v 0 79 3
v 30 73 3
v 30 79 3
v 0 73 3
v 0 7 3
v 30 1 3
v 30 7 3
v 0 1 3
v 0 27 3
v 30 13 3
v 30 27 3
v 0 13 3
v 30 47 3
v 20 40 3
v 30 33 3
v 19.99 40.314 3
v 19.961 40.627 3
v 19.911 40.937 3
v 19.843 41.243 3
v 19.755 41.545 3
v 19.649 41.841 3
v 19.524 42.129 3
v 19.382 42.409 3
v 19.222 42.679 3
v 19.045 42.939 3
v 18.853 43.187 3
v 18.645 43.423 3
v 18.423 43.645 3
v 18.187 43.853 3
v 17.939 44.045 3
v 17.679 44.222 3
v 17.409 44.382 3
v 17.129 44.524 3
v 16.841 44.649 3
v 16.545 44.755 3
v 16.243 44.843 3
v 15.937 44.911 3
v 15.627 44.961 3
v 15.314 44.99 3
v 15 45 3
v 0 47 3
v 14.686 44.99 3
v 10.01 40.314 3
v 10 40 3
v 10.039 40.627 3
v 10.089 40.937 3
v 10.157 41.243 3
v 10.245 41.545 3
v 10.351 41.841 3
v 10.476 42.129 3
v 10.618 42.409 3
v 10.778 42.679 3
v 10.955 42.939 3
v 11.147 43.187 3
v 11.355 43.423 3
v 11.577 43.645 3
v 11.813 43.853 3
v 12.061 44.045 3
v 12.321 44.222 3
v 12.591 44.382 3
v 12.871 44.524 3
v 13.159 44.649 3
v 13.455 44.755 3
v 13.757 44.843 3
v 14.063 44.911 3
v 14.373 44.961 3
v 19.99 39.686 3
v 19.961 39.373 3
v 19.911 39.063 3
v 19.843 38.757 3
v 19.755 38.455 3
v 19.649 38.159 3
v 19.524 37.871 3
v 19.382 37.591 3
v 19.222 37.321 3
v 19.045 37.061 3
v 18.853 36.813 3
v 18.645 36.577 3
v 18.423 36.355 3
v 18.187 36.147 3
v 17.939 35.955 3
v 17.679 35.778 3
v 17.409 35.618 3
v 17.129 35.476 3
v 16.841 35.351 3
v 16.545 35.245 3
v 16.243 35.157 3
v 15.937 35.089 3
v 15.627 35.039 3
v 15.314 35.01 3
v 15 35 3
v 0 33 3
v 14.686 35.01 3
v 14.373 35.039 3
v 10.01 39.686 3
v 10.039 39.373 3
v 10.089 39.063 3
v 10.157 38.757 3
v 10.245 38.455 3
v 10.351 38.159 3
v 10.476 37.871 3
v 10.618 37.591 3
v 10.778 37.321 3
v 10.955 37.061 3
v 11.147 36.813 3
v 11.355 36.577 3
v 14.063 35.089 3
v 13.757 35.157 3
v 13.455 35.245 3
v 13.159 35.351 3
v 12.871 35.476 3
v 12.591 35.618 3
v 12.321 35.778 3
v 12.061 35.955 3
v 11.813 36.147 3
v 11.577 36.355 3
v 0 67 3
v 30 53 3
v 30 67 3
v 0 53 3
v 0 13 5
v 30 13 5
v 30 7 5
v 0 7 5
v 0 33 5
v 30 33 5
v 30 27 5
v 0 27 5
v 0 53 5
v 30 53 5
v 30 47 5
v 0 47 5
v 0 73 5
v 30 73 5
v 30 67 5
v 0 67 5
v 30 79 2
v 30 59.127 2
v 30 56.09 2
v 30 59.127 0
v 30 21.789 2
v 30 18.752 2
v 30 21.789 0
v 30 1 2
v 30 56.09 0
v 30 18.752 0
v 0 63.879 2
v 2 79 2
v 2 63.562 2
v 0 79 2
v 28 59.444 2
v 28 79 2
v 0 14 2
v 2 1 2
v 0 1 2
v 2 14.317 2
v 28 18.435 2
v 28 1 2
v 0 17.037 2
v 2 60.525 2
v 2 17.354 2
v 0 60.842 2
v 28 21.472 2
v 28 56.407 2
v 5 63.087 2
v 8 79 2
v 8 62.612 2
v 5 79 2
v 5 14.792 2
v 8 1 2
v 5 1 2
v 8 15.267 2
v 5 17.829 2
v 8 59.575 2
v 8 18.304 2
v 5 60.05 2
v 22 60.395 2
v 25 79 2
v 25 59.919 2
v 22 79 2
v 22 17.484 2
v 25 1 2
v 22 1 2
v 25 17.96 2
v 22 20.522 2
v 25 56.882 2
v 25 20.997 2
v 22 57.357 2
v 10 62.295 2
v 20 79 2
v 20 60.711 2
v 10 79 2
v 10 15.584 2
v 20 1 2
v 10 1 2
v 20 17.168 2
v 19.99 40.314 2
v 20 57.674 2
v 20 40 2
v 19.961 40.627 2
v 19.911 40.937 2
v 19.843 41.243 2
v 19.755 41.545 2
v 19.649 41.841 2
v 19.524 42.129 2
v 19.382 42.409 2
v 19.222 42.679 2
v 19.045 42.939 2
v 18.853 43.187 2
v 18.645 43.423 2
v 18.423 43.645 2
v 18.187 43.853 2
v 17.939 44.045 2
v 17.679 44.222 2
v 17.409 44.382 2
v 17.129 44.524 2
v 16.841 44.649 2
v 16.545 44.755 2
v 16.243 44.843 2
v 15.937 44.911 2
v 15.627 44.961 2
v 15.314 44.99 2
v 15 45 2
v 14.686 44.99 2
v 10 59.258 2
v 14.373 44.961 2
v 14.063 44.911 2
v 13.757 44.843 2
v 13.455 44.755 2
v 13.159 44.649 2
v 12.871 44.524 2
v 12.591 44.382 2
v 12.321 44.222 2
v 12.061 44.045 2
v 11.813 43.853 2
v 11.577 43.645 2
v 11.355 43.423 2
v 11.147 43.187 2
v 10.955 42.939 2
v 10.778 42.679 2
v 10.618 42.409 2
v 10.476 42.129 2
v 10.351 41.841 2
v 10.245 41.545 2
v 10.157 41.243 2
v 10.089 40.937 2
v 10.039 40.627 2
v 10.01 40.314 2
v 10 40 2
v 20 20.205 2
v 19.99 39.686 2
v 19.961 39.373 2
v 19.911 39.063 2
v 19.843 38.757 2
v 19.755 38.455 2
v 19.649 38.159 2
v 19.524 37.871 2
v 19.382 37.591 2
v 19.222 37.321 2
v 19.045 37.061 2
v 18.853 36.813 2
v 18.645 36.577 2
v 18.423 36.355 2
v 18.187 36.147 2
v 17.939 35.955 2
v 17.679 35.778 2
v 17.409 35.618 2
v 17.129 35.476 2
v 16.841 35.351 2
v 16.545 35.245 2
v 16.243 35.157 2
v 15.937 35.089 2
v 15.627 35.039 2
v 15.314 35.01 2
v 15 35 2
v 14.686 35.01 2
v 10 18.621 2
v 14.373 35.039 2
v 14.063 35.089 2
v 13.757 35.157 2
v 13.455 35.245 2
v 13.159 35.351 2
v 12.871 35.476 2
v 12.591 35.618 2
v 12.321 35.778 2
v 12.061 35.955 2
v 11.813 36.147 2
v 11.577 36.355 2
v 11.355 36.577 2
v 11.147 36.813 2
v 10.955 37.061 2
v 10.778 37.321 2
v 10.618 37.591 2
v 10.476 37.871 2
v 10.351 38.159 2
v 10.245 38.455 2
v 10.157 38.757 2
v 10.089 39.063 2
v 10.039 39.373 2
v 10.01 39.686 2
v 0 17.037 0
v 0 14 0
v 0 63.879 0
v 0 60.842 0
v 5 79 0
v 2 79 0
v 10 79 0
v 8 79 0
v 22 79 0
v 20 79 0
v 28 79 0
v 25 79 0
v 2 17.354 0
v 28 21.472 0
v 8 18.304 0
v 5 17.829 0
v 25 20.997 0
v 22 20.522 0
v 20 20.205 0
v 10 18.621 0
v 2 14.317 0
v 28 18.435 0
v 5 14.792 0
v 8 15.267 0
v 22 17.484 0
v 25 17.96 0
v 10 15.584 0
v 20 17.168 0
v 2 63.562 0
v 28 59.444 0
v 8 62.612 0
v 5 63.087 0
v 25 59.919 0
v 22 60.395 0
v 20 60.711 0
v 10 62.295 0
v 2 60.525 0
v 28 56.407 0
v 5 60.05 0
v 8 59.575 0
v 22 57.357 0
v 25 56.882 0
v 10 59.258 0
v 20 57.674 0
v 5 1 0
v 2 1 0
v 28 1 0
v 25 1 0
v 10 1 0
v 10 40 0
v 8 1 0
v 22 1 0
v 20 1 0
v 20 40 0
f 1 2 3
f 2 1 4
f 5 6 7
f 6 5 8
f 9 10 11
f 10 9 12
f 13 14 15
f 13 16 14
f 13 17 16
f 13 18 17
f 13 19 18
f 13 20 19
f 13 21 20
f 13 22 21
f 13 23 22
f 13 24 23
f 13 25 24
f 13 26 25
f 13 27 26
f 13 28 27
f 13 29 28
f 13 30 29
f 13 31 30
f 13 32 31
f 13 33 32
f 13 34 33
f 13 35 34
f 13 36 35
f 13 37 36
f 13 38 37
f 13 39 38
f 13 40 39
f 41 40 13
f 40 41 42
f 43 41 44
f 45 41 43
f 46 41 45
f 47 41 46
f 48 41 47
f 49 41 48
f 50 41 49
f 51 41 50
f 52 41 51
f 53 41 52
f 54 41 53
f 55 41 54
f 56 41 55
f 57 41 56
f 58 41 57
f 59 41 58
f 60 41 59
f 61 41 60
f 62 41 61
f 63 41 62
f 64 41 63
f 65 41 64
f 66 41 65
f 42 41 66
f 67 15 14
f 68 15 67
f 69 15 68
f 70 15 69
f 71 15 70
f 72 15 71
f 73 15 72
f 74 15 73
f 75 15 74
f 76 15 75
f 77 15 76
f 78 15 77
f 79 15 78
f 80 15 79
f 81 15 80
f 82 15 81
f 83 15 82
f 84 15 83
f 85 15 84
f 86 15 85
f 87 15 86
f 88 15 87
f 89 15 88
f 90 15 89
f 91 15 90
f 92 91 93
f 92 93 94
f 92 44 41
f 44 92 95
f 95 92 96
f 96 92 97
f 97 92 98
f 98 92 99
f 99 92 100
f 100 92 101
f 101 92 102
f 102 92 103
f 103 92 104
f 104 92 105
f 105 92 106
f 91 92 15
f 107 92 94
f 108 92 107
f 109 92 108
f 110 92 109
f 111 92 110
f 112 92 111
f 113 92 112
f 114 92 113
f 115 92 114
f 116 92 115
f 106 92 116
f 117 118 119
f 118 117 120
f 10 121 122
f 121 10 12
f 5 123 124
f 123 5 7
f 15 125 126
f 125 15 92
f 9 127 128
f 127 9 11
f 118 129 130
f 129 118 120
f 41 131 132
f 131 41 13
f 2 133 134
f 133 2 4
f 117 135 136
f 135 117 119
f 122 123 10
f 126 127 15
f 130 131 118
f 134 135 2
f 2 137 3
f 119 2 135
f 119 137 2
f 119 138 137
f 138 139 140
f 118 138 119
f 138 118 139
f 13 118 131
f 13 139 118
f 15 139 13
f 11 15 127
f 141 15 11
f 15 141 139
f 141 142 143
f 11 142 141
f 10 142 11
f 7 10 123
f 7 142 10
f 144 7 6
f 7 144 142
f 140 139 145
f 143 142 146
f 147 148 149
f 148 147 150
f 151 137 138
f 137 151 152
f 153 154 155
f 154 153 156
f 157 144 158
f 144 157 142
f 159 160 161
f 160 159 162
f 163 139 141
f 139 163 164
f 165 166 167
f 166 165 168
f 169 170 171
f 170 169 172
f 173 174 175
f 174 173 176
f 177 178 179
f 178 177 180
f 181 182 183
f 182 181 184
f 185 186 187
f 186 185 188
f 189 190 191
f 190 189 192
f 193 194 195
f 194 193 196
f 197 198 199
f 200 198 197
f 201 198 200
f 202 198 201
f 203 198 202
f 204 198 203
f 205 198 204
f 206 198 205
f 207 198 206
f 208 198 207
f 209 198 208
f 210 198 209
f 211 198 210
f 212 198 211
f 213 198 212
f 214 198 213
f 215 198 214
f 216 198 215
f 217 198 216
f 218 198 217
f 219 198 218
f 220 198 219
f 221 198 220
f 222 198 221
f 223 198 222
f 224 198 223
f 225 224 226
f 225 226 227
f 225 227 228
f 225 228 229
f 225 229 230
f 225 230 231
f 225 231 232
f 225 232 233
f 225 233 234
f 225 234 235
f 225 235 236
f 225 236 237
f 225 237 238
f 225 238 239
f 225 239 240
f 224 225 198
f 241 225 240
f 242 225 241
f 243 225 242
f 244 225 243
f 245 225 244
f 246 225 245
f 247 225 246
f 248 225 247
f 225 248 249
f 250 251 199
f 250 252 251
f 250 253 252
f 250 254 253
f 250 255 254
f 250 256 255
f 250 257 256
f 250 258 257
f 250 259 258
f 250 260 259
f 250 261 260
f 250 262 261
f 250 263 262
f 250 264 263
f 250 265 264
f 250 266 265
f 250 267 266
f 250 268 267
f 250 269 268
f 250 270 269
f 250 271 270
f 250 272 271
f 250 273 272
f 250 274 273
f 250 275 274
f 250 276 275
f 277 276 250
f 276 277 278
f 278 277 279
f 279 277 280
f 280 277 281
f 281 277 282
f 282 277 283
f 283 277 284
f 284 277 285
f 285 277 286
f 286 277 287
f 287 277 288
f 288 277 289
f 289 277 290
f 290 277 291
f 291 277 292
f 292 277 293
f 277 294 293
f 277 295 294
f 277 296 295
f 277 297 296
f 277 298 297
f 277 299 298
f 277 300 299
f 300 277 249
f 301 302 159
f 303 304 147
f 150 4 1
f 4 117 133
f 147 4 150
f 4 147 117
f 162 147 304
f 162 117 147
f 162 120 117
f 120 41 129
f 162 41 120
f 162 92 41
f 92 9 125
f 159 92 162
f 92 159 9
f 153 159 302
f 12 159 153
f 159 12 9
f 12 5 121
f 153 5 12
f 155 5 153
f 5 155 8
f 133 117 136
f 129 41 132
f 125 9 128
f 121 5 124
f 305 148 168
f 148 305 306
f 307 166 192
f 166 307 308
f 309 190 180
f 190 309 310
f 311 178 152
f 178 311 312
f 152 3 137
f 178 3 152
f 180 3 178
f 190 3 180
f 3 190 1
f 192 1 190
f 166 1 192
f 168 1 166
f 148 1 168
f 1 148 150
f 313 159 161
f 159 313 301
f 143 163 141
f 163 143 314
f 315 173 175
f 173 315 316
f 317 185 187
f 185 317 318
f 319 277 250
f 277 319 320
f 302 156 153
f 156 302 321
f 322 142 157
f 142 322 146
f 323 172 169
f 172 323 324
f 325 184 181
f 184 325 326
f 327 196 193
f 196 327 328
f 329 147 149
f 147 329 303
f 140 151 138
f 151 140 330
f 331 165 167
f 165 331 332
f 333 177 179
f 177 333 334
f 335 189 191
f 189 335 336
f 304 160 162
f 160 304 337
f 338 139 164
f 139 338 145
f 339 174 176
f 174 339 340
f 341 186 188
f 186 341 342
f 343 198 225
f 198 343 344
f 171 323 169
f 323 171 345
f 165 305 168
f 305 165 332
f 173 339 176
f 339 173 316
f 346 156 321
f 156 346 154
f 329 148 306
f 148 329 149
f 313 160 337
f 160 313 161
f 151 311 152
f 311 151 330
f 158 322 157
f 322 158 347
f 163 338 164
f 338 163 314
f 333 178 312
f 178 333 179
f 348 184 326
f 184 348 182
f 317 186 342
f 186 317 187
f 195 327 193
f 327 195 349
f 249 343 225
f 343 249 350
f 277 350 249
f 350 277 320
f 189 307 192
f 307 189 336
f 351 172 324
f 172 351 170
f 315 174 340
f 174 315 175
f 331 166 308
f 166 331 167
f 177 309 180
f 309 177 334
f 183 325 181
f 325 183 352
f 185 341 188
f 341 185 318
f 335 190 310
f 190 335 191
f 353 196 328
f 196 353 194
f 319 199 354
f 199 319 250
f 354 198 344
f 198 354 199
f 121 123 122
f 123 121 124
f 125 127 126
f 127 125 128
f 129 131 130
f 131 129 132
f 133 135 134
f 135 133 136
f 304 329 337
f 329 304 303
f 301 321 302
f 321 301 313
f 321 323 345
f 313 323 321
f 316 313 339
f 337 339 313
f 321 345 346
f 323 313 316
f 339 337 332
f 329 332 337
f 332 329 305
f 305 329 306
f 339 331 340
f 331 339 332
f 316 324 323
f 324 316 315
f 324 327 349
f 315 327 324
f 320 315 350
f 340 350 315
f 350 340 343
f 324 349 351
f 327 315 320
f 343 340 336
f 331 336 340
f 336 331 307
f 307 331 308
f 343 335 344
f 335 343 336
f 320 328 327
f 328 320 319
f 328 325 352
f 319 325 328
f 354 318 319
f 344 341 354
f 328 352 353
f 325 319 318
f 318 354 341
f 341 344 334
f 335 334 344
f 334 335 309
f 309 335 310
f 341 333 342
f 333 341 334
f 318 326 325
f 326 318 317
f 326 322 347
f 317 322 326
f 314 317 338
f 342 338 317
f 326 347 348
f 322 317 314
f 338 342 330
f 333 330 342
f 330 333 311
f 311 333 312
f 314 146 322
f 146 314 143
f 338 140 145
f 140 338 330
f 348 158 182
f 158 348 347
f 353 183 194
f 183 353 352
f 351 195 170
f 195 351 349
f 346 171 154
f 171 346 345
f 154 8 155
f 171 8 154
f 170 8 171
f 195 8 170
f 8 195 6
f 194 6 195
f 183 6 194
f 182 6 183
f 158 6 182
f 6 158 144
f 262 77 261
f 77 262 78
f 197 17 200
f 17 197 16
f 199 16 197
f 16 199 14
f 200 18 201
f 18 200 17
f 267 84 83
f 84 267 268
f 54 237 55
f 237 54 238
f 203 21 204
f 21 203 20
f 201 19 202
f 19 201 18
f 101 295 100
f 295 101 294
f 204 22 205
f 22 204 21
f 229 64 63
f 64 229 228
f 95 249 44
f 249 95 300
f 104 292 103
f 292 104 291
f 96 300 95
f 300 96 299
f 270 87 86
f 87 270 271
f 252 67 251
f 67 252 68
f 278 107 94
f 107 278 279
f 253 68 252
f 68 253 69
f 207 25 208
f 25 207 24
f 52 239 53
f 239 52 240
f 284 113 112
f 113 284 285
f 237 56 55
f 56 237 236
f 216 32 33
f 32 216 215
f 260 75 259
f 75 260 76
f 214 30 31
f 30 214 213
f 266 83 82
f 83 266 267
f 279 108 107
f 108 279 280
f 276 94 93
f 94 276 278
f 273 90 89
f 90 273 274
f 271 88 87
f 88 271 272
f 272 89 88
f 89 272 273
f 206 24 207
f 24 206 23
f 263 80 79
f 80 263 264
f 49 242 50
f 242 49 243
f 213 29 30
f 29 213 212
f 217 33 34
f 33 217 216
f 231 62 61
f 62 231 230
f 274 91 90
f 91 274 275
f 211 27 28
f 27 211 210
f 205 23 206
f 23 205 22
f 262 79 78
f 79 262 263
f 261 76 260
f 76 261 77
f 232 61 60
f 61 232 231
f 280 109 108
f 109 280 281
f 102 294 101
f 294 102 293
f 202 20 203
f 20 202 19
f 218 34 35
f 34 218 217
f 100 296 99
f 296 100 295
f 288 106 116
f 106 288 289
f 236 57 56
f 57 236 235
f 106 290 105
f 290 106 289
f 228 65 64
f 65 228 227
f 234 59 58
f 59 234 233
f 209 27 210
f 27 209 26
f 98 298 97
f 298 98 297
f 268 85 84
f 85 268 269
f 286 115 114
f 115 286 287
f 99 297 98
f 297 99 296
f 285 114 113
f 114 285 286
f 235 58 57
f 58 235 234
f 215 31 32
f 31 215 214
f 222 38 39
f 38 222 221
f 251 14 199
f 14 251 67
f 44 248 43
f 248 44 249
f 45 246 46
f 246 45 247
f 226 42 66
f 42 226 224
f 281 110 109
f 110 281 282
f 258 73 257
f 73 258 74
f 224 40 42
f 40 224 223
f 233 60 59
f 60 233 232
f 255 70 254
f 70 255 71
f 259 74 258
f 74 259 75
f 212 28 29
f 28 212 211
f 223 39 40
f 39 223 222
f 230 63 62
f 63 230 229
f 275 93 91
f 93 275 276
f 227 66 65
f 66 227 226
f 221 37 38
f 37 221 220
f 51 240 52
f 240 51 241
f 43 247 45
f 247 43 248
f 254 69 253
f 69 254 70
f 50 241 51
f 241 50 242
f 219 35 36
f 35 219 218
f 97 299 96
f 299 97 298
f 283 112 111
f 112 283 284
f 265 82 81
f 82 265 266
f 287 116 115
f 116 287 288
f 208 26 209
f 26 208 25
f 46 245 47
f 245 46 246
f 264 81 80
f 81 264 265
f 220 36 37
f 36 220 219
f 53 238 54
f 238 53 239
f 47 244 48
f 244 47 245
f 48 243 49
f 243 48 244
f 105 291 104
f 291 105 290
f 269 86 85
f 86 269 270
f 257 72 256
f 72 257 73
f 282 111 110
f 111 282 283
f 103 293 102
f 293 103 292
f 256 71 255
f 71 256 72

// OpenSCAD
/*
don't PLA will be strong enough.
*/

module p8020(len){
  difference(){
    cube([len, 80, 30]);
    translate([-1, 10 - 3, 0])cube([len + 2, 6, 6]);
    translate([-1, 30 - 3, 0])cube([len + 2, 6, 6]);
    translate([-1, 50 - 3, 0])cube([len + 2, 6, 6]);
    translate([-1, 70 - 3, 0])cube([len + 2, 6, 6]);
  }
}
module kick(){
  translate([0, -1, -18])
  difference(){
    cube([30, 80, 20]);
    translate([0, 15, -1])rotate([0, 0, 9])cube([40, 3, 100]);
    translate([-1, 65-3, -1])rotate([0, 0, -9])cube([40, 3, 100]);
    translate([2, -1, 0]) cube([3, 100, 100]);
    translate([25, -1, 0])cube([3, 100, 100]);
    translate([ 8, -1, 0])cube([2, 100, 100]);
    translate([20, -1, 0])cube([2, 100, 100]);
  }
}
//kick();

difference(){
  translate([0, 1, 0])cube([30, 78, 5]);
  translate([-1, 0, 3])p8020(102);
  kick();
  translate([15, 40, -1])cylinder(h=100, d=10, $fn=100);
}
/*
*/
